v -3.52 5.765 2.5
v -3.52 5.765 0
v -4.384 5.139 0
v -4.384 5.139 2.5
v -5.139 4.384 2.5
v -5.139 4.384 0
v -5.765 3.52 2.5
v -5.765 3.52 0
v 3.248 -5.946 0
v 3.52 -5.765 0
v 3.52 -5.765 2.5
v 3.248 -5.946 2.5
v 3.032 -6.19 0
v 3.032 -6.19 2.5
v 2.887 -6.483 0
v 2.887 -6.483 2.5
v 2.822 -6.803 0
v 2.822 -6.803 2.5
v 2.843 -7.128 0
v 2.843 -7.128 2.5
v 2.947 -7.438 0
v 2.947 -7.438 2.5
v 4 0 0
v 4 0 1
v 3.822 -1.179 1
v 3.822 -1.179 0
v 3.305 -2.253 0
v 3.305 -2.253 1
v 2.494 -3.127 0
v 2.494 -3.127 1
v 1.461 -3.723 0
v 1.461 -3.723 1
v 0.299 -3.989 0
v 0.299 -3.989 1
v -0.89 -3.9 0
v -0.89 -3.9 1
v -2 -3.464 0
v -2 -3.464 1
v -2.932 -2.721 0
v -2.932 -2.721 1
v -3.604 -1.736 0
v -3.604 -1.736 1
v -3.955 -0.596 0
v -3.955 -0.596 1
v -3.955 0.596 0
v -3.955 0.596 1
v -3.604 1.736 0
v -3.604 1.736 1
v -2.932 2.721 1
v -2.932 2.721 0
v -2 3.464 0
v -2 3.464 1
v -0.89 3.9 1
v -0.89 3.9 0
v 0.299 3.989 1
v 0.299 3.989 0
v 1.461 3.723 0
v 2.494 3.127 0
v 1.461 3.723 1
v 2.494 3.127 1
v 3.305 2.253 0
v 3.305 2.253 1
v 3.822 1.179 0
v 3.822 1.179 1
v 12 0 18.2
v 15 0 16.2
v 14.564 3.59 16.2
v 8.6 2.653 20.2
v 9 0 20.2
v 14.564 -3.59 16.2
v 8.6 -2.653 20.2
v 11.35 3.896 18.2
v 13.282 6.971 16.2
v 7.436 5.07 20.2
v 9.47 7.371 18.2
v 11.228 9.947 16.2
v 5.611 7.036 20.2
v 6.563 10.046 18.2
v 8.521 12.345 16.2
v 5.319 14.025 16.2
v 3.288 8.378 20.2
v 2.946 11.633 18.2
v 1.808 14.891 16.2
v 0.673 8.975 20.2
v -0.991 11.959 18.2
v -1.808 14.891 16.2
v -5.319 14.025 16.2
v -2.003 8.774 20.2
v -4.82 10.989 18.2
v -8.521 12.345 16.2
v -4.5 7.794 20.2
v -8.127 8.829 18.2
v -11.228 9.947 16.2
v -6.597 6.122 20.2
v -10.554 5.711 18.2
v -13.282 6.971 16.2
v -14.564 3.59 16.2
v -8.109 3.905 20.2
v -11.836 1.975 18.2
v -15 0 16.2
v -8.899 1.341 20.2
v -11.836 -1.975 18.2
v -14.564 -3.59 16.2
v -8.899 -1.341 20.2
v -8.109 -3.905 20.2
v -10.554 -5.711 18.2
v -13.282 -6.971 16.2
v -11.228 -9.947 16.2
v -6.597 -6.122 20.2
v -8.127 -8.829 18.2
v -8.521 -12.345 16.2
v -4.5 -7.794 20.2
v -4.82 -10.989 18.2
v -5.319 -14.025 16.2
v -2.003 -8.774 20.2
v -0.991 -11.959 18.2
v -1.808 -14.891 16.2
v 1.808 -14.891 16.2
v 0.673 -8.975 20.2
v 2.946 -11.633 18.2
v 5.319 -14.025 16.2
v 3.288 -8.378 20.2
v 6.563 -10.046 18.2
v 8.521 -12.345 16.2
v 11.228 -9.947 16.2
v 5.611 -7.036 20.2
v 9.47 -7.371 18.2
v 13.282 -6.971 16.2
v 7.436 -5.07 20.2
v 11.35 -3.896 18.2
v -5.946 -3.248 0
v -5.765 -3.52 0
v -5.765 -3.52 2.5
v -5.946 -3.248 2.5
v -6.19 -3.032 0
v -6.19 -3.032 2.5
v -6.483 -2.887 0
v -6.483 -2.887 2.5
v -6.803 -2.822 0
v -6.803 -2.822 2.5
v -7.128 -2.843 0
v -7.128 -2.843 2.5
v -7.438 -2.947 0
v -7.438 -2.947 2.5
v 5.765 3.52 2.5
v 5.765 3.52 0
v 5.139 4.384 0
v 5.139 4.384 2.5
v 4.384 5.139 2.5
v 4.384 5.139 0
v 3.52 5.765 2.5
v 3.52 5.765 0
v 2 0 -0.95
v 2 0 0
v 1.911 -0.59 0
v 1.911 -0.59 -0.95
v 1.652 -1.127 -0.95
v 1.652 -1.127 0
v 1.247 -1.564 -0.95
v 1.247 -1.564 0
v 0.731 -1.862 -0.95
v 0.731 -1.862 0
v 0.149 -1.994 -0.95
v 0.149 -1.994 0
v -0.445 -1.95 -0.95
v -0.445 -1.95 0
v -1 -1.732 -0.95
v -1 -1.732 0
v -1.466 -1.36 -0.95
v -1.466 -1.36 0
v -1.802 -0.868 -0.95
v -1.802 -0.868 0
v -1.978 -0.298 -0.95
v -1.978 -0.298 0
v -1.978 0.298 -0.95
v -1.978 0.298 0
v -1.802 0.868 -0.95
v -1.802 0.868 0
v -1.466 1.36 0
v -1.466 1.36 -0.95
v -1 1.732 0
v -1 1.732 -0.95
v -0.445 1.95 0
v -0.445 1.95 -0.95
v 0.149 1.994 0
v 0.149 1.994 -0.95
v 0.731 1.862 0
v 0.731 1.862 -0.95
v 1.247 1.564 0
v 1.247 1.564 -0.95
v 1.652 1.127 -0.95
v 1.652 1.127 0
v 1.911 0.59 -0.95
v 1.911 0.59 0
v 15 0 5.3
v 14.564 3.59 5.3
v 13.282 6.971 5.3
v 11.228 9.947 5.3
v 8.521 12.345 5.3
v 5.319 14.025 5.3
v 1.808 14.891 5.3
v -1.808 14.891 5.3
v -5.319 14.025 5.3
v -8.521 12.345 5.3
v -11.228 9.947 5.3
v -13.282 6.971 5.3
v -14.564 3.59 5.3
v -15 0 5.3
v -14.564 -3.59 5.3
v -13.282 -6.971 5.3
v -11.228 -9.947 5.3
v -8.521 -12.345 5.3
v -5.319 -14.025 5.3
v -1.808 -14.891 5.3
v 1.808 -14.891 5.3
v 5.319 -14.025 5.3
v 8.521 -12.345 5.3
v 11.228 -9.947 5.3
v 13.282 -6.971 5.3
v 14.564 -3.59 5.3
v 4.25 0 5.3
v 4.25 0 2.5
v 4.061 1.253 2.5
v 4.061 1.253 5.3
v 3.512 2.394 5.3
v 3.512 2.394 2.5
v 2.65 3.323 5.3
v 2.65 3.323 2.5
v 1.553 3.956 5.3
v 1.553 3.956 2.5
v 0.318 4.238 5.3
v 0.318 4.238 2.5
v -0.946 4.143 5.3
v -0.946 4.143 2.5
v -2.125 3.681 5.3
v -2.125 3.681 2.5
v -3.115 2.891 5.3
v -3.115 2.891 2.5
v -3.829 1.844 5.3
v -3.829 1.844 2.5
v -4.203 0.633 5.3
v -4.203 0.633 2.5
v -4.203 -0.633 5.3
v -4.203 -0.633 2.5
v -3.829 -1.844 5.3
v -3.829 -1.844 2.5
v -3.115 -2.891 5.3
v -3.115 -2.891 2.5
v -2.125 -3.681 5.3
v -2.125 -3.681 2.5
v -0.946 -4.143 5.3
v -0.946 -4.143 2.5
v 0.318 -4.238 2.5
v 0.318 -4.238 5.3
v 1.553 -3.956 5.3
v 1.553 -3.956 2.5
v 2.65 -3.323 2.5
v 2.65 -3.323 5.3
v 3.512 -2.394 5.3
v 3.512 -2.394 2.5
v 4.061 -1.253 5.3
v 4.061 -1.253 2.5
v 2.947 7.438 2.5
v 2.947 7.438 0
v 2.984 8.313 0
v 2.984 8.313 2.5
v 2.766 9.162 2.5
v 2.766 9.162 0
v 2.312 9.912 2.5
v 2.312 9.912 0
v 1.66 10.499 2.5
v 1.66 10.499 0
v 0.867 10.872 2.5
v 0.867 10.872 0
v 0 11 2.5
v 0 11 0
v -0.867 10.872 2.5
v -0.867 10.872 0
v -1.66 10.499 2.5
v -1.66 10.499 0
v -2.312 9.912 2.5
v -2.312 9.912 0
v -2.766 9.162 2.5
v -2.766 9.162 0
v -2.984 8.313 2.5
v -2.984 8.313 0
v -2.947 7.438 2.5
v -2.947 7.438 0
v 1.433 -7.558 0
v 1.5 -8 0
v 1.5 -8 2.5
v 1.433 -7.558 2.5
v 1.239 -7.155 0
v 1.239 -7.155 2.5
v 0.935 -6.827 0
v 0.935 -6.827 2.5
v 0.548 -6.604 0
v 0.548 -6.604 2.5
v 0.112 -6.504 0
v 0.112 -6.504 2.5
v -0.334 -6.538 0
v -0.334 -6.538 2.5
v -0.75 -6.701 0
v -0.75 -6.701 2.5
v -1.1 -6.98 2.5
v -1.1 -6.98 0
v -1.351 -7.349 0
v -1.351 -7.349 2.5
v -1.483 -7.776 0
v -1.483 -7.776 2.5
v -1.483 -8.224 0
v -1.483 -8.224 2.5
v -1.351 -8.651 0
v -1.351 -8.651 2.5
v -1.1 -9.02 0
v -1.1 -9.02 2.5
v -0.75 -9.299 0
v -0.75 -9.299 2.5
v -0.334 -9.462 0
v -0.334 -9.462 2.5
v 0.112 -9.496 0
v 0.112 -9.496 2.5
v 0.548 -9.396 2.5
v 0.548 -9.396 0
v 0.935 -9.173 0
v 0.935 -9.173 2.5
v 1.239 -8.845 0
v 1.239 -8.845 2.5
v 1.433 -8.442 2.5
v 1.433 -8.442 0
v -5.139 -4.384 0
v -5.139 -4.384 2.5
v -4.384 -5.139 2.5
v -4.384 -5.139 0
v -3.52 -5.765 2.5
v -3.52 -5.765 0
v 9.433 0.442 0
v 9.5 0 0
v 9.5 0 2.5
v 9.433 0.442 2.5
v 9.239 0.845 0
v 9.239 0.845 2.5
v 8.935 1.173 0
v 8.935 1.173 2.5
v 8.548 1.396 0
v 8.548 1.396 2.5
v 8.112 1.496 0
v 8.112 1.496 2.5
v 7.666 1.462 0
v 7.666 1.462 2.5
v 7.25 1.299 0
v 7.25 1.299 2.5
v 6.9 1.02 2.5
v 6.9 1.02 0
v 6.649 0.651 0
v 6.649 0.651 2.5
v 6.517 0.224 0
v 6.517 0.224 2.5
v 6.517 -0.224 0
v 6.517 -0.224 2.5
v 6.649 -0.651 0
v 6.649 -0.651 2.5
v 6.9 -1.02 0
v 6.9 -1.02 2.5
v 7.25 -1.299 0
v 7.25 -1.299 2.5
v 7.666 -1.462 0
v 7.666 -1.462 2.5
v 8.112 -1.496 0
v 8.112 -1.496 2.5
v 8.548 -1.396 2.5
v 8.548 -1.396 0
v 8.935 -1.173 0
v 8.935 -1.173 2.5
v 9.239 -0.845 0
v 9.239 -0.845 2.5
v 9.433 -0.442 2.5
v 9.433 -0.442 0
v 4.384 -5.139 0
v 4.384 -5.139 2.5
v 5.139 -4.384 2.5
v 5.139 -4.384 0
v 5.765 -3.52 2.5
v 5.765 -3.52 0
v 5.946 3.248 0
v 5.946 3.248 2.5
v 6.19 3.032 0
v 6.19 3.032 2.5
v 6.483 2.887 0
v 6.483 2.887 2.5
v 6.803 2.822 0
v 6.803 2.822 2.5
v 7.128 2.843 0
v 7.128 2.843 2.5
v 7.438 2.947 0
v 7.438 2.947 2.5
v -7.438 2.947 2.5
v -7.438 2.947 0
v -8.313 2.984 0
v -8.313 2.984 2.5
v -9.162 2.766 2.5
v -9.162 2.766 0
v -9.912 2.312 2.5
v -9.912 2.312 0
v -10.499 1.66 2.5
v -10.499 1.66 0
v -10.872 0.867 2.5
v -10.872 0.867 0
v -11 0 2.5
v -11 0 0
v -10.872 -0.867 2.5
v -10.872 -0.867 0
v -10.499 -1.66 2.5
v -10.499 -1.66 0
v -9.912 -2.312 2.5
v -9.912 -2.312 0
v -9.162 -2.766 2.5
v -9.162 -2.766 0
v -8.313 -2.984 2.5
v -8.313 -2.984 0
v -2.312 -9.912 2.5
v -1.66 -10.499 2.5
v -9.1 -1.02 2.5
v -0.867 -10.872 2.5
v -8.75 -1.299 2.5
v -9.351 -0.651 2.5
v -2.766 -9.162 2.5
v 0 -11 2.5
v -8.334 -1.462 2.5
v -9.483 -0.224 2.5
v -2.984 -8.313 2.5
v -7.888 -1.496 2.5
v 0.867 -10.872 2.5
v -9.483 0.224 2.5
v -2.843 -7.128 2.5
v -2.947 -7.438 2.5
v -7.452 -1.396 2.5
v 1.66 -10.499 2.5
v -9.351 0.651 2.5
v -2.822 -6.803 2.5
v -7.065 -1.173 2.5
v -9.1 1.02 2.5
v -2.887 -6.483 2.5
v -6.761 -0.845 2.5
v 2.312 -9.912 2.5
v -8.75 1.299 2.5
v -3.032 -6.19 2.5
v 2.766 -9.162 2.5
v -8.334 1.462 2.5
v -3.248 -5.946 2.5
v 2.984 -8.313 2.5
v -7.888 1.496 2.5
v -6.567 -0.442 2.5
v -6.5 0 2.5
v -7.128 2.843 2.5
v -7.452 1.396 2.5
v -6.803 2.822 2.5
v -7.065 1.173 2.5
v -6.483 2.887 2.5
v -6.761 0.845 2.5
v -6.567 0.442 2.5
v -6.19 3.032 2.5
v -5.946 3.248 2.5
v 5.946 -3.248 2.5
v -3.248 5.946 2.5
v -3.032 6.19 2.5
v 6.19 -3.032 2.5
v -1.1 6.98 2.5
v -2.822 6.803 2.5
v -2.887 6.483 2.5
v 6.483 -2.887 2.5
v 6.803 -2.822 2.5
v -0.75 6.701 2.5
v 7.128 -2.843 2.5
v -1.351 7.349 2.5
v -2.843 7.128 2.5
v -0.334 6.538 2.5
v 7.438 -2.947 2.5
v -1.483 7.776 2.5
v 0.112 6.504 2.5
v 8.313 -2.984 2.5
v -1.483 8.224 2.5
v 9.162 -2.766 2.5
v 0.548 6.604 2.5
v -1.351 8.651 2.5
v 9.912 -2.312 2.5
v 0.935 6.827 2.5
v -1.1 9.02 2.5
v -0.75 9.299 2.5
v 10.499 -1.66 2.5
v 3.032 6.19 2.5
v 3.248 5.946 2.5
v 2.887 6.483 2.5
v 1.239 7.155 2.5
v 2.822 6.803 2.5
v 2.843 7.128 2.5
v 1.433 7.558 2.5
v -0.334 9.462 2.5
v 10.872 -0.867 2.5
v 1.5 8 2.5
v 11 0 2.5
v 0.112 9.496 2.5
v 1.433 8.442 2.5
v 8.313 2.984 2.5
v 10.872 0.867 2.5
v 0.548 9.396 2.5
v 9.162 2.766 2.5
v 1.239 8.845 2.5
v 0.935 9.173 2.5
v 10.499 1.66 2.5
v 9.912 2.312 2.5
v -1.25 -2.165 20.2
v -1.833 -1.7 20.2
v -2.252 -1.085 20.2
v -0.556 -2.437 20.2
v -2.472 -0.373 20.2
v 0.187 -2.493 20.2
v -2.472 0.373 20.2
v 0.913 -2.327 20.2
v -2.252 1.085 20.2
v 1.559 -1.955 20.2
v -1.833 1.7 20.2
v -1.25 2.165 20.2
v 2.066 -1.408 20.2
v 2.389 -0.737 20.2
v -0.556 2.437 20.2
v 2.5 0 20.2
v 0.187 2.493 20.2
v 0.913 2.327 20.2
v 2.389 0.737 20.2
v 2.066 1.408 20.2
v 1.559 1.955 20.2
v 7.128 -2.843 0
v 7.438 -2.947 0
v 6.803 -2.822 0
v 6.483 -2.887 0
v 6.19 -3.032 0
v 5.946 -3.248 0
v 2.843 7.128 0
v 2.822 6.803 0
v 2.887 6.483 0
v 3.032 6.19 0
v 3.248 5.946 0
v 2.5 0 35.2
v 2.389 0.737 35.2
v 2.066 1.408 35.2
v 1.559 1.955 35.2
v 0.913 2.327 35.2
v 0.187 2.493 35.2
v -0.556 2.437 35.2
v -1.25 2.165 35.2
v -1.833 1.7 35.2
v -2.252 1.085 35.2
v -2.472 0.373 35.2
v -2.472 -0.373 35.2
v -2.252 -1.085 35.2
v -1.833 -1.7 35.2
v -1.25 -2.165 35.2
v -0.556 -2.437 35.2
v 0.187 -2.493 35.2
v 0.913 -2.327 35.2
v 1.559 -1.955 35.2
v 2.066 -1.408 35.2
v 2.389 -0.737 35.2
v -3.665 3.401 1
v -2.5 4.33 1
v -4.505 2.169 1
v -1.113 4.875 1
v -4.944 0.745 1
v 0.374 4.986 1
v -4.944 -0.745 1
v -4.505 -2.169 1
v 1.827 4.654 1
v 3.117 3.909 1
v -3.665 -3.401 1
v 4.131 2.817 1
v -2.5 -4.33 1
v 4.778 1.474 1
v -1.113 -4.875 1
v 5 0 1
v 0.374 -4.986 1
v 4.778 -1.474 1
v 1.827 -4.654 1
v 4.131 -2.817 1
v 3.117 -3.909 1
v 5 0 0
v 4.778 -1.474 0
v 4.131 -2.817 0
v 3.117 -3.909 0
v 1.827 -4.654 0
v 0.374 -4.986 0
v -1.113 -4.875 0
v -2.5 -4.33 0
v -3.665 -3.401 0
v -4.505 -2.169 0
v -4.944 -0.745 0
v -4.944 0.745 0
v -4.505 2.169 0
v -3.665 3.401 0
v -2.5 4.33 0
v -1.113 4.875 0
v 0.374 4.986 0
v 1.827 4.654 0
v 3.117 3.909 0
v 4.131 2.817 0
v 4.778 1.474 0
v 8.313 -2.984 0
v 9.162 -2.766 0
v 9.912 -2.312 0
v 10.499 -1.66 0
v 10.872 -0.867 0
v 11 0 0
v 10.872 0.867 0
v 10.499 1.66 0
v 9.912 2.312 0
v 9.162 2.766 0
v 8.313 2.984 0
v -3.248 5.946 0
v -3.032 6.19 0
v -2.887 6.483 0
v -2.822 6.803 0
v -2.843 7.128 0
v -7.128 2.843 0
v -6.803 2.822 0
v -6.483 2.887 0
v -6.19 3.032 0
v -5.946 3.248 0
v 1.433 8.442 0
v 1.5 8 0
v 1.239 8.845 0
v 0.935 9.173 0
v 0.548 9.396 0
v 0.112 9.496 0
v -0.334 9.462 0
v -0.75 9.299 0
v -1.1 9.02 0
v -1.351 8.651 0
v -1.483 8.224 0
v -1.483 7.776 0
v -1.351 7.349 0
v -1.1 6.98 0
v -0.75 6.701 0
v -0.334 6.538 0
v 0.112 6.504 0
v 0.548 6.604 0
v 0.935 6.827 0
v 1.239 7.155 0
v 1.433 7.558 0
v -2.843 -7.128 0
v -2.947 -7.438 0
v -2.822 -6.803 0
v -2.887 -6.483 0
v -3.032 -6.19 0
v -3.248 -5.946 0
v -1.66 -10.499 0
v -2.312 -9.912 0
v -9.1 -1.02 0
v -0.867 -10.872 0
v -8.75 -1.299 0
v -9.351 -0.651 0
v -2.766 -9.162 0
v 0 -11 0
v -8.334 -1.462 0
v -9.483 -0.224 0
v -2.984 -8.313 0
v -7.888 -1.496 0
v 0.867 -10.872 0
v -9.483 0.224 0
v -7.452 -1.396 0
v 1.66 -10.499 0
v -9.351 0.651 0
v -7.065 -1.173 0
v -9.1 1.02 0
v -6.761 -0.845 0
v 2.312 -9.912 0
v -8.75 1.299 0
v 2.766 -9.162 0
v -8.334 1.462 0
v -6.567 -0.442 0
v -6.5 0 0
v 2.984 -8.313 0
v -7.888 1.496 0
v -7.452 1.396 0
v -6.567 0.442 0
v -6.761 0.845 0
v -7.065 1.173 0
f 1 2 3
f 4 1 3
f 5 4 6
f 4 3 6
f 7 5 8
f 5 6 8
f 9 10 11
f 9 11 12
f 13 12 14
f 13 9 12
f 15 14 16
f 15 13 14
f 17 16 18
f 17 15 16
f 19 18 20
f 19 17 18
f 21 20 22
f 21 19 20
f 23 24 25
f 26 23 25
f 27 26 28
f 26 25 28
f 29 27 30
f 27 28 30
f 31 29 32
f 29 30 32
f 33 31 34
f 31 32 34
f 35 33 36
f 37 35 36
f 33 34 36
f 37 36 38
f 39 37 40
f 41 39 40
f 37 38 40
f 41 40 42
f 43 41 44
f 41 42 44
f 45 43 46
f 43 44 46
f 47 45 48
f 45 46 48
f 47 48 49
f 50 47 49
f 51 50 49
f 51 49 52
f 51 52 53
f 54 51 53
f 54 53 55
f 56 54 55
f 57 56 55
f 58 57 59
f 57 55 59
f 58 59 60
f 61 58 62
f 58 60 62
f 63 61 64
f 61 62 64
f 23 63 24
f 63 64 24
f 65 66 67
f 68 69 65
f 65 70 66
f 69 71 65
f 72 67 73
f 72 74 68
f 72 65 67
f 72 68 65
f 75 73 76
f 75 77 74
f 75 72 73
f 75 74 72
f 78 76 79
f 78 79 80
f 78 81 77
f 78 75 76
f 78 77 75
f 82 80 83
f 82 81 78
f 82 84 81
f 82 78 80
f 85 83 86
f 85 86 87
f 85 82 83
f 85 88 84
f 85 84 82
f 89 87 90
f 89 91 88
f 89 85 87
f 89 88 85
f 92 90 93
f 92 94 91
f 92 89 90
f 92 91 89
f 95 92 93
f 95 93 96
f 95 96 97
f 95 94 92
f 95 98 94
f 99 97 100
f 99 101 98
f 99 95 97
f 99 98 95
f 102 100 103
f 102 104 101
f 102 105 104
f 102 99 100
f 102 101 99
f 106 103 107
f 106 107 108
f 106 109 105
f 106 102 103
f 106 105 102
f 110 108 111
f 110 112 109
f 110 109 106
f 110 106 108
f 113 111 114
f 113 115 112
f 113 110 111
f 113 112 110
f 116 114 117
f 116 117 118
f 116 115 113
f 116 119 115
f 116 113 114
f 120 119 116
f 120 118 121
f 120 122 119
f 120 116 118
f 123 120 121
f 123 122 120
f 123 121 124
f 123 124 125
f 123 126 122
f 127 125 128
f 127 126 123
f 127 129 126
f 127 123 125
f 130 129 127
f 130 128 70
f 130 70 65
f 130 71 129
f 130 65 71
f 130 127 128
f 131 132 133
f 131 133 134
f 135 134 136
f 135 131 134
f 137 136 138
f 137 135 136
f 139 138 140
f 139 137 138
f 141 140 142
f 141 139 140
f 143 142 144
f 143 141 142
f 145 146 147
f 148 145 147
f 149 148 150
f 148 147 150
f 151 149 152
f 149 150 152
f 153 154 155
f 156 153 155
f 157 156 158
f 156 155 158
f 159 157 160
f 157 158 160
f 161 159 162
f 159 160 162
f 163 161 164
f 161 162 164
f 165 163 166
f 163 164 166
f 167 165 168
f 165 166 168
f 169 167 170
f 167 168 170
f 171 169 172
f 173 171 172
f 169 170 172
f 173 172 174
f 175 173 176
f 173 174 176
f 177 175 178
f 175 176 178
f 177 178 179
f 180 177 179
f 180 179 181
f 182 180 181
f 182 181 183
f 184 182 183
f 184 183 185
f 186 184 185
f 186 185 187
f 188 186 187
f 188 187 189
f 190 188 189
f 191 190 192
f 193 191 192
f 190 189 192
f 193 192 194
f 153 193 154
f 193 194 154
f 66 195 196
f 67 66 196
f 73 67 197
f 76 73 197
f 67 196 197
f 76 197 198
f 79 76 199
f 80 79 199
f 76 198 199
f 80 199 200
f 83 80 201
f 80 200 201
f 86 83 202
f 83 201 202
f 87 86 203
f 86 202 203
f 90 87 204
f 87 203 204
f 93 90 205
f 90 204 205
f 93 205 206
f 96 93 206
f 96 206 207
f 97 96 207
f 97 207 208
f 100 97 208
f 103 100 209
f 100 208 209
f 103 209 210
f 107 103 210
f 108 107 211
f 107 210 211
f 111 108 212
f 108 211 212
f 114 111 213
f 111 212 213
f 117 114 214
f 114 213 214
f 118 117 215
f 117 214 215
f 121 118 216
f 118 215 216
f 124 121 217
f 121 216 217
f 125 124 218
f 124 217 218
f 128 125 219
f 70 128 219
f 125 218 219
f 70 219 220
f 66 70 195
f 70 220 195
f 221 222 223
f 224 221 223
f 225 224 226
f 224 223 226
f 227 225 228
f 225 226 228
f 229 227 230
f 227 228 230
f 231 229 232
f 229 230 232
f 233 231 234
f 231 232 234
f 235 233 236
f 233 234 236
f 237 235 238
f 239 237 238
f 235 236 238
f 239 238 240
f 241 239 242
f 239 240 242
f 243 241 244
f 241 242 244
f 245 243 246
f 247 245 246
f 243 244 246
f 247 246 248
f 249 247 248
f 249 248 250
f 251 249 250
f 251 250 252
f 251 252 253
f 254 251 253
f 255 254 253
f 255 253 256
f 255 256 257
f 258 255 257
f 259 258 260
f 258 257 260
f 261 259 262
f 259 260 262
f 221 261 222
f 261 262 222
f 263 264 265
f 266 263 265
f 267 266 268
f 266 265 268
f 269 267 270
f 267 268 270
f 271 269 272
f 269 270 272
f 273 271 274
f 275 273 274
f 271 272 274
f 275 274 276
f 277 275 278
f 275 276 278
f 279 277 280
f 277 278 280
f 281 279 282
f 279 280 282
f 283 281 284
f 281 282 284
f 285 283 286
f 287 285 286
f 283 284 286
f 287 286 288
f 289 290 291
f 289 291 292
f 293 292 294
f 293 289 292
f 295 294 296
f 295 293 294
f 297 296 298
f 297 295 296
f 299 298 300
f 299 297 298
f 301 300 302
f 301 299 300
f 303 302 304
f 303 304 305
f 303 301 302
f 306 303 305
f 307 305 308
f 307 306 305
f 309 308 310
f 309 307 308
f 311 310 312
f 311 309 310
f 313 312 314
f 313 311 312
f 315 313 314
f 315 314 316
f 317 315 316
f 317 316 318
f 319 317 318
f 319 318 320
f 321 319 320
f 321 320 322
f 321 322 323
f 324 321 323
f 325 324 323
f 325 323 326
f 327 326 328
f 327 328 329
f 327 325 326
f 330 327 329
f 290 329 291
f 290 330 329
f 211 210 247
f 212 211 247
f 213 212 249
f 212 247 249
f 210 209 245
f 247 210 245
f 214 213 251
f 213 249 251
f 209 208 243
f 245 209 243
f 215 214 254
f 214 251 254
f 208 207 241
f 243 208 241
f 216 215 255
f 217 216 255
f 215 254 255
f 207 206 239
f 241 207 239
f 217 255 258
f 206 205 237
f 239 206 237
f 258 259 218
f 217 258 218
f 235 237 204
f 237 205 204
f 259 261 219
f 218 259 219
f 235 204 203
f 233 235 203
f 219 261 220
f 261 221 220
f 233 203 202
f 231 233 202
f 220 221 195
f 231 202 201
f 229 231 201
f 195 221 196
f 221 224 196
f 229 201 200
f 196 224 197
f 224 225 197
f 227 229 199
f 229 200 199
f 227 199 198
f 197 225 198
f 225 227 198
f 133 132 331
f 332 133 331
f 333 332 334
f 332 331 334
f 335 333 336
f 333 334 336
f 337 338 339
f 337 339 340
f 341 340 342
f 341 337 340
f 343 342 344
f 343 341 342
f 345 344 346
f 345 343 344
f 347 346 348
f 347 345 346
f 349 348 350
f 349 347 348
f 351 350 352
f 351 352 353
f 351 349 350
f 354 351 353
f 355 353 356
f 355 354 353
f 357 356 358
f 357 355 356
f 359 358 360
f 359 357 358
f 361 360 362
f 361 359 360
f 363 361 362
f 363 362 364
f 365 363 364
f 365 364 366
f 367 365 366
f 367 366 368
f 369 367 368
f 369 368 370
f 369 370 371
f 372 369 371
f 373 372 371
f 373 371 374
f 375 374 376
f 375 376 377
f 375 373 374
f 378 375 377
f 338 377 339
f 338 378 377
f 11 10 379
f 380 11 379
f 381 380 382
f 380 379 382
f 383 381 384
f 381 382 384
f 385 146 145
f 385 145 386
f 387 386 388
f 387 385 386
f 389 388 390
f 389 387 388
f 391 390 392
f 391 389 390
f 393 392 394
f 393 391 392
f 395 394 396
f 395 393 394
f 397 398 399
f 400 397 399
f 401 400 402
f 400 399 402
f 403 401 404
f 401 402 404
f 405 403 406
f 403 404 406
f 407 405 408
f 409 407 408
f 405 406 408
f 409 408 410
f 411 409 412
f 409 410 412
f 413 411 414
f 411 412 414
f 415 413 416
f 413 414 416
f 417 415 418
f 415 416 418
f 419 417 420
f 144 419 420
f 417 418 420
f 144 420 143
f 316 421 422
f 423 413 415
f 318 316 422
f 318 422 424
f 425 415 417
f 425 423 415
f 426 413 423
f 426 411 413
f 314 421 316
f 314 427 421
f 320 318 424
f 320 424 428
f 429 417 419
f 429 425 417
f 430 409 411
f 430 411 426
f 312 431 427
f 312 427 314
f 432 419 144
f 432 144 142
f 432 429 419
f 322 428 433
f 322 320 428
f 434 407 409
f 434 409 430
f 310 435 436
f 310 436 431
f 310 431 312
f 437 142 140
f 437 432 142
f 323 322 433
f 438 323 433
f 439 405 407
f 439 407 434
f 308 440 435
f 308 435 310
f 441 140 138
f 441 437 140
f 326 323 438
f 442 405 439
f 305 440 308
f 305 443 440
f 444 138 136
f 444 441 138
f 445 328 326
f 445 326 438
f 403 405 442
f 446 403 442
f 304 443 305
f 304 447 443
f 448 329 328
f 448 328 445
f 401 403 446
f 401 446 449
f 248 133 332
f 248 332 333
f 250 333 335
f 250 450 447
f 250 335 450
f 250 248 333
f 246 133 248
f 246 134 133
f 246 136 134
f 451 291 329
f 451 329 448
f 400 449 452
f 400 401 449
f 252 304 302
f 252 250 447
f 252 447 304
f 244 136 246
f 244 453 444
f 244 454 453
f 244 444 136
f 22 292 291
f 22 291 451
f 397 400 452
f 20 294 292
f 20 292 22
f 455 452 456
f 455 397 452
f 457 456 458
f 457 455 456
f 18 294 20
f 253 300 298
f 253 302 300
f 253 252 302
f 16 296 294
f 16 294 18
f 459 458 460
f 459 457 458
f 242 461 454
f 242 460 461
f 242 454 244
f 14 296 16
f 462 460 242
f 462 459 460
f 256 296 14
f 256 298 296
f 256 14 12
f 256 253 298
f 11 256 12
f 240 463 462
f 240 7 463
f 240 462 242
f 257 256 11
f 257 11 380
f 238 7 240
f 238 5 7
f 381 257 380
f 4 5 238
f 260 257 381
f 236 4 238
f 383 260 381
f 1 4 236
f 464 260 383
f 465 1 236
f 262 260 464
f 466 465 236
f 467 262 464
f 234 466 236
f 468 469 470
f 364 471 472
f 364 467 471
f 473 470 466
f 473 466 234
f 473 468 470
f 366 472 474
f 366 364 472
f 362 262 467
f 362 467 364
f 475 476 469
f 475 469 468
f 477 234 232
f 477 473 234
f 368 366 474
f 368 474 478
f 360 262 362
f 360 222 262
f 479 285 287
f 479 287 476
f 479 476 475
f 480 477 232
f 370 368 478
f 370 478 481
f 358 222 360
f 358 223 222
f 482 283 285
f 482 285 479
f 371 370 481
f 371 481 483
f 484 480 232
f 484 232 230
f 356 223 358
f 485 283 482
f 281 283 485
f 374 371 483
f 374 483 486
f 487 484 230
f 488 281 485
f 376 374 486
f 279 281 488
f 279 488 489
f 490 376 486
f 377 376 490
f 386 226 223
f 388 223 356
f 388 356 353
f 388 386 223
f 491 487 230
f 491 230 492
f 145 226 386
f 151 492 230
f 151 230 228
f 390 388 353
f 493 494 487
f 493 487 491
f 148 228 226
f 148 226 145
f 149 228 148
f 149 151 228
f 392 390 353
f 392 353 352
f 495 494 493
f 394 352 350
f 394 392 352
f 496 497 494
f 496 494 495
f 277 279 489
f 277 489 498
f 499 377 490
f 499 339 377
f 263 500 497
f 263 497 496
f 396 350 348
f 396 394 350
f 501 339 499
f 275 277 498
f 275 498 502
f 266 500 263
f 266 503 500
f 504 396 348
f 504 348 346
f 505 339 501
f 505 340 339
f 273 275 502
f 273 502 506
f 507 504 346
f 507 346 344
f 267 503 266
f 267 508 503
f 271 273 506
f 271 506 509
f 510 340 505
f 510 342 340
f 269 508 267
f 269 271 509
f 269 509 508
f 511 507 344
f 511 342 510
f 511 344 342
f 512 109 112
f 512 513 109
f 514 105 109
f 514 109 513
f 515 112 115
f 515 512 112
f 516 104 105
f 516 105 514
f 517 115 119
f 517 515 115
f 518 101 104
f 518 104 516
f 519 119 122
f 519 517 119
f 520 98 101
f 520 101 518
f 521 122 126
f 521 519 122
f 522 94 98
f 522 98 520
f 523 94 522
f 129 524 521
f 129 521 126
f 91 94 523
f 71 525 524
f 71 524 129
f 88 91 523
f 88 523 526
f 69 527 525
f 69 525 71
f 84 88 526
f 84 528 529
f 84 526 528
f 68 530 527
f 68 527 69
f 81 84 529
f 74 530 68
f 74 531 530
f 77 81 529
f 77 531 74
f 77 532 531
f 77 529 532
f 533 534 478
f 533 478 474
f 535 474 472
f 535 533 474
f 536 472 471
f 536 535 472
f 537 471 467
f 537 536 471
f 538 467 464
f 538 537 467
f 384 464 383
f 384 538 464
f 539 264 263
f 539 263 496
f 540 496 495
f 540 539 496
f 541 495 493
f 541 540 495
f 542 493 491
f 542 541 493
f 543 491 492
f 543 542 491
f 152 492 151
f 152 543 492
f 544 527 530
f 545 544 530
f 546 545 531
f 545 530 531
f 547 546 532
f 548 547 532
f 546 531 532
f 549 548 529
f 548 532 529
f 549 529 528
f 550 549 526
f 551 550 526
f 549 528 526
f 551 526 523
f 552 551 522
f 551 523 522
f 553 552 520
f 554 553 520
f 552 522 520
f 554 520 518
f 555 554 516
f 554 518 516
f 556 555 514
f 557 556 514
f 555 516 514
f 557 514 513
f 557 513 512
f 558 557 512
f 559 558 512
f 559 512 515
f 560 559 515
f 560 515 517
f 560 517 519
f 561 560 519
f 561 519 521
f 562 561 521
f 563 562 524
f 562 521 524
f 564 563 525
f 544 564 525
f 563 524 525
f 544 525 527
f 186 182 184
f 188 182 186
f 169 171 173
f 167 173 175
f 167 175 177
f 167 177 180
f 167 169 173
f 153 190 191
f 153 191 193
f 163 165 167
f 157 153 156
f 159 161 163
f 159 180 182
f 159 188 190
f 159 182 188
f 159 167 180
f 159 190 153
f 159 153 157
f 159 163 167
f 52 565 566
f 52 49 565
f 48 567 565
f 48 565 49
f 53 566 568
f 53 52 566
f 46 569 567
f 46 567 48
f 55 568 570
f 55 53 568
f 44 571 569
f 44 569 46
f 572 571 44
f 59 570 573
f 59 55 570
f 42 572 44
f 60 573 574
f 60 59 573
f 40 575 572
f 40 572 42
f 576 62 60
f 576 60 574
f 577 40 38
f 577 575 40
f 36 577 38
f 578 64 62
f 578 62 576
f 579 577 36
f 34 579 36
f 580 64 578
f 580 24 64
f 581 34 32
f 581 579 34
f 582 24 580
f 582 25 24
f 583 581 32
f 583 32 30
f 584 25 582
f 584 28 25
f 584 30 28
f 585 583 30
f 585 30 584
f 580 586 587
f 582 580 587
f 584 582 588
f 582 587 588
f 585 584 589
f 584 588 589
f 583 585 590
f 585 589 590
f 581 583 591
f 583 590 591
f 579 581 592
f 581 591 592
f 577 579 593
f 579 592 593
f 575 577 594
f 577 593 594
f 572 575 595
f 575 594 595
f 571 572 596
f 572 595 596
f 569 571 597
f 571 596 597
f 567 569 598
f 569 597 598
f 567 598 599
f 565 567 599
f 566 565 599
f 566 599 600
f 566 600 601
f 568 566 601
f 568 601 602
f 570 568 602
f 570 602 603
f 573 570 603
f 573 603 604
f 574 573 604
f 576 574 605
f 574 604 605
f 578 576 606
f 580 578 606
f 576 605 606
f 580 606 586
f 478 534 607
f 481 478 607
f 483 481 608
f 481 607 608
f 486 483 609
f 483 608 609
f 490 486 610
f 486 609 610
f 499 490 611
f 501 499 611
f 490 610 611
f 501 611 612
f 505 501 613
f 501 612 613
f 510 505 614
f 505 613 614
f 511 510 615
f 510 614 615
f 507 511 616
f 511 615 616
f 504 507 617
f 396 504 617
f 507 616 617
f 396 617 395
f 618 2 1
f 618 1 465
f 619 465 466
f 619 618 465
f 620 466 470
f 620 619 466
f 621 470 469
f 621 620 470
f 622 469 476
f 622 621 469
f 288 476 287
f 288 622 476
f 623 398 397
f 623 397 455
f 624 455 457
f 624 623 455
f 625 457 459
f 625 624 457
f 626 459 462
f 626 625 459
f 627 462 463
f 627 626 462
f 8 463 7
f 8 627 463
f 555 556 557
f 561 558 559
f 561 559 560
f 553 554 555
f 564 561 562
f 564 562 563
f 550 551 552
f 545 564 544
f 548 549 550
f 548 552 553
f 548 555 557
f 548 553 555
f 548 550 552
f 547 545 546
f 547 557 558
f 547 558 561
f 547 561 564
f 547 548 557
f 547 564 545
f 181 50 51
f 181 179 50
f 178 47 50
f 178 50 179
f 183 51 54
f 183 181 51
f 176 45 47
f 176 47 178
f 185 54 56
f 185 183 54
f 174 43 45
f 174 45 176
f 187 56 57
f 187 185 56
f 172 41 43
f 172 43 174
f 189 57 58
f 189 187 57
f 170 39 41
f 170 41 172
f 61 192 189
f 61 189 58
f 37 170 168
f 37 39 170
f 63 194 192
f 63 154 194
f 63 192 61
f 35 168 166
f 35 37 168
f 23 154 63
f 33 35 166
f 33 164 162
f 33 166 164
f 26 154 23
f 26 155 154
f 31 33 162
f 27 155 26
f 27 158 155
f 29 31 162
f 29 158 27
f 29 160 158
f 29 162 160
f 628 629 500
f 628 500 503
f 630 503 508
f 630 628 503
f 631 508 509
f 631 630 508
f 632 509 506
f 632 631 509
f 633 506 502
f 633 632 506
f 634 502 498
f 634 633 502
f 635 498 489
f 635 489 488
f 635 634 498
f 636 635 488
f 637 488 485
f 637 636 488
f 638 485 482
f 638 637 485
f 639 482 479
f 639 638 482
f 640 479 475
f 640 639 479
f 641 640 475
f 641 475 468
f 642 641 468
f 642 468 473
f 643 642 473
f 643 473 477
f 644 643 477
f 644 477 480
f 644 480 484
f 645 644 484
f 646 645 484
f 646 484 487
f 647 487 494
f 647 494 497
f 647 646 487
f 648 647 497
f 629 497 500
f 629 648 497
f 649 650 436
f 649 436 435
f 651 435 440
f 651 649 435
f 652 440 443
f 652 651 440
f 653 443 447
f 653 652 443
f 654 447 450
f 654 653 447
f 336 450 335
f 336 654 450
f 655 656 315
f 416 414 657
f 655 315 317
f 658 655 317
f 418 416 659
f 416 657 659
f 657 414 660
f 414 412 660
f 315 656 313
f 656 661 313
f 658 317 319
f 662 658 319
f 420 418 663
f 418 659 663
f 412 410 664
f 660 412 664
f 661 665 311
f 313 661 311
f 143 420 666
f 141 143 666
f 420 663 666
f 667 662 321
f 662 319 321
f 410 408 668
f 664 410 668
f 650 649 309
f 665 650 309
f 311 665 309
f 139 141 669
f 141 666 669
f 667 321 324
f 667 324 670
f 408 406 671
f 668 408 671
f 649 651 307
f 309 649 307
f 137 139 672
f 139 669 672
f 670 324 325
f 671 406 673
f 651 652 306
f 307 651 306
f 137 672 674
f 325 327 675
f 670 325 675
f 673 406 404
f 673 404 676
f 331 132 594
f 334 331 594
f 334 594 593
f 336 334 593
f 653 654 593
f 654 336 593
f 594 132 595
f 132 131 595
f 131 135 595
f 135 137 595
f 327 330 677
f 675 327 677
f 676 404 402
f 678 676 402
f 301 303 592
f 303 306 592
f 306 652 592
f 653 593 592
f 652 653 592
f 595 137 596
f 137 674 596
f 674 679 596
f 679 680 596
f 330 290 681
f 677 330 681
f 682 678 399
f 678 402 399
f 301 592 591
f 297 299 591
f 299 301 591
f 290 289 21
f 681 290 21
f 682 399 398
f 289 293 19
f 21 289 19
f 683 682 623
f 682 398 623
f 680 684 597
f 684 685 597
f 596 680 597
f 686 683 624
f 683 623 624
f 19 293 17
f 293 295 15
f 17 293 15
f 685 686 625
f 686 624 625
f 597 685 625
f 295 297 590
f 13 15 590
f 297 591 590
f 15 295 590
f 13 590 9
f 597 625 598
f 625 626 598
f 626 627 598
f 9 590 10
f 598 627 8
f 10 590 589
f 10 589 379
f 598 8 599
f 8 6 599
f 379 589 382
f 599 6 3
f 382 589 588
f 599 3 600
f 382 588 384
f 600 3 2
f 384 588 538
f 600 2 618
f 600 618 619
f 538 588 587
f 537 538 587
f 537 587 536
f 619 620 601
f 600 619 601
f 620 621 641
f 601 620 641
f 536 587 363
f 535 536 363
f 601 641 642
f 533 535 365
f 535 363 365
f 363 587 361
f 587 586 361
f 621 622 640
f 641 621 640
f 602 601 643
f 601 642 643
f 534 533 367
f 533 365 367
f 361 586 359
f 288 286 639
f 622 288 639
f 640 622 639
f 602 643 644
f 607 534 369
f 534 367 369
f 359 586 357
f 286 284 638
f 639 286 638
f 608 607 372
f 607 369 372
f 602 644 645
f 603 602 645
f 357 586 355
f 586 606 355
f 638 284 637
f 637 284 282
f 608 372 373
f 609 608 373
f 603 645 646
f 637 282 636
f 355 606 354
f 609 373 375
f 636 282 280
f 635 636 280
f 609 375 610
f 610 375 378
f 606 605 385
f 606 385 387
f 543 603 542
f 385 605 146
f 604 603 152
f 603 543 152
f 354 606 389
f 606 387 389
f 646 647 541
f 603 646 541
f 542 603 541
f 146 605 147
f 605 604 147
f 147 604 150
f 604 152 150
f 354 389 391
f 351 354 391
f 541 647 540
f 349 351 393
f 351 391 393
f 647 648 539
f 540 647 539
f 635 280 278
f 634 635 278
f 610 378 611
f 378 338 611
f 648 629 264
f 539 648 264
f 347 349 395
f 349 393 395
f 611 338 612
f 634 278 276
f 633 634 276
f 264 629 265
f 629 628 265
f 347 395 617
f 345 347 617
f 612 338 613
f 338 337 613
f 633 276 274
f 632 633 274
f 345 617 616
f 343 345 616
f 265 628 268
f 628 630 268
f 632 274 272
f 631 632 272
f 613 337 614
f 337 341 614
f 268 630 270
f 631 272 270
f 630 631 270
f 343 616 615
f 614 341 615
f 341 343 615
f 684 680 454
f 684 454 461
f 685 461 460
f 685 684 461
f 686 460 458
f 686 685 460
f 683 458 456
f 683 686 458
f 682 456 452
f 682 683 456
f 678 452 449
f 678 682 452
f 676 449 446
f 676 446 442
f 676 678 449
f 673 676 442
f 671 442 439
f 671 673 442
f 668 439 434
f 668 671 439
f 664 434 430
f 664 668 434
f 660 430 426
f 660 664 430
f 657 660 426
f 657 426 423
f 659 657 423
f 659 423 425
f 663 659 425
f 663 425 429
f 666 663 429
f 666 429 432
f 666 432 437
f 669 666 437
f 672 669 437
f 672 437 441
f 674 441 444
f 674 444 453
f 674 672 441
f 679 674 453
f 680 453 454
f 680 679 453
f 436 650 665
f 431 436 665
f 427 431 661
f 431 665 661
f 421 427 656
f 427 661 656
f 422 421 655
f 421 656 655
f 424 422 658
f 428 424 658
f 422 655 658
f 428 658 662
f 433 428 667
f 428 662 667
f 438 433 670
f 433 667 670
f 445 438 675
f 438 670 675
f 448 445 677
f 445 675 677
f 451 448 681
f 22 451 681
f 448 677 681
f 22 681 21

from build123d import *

# Parameters (mm, degrees)
SKETCH_R      = 1.5
PAD_DEPTH     = 2.5
SKETCH001_R   = 4.25
PAD001_DEPTH  = 2.8
SKETCH002_R   = 15
PAD002_DEPTH  = 14.9
SKETCH003_R   = 2.5
PAD003_DEPTH  = 15
CHAMFER_SIZE2 = 6
CHAMFER_SIZE  = 4
SKETCH004_R   = 5
POCKET_DEPTH  = 1
SKETCH005_R   = 4
PAD004_DEPTH  = 1
SKETCH006_R   = 2
PAD005_DEPTH  = 0.95


with BuildPart() as part:
    # Sketch → Pad (new body)
    with BuildSketch(Plane.XY):
        with BuildLine():
            ThreePointArc((2.946794, 7.4375), (0, 11), (-2.946794, 7.4375))
            ThreePointArc((-3.519561, 5.765095), (-2.886811, 6.482674), (-2.946794, 7.4375))
            ThreePointArc((-3.519561, 5.765095), (-4.776172, 4.776172), (-5.765095, 3.519561))
            ThreePointArc((-7.4375, 2.946794), (-6.482674, 2.886811), (-5.765095, 3.519561))
            ThreePointArc((-7.4375, 2.946794), (-11, 0), (-7.4375, -2.946794))
            ThreePointArc((-5.765095, -3.519561), (-6.482674, -2.886811), (-7.4375, -2.946794))
            ThreePointArc((-5.765095, -3.519561), (-4.776172, -4.776172), (-3.519561, -5.765095))
            ThreePointArc((-2.946794, -7.4375), (-2.886811, -6.482674), (-3.519561, -5.765095))
            ThreePointArc((-2.946794, -7.4375), (0, -11), (2.946794, -7.4375))
            ThreePointArc((3.519561, -5.765095), (2.886811, -6.482674), (2.946794, -7.4375))
            ThreePointArc((3.519561, -5.765095), (4.776172, -4.776172), (5.765095, -3.519561))
            ThreePointArc((7.4375, -2.946794), (6.482674, -2.886811), (5.765095, -3.519561))
            ThreePointArc((7.4375, -2.946794), (11, 0), (7.4375, 2.946794))
            ThreePointArc((5.765095, 3.519561), (6.482674, 2.886811), (7.4375, 2.946794))
            ThreePointArc((5.765095, 3.519561), (4.776172, 4.776172), (3.519561, 5.765095))
            ThreePointArc((2.946794, 7.4375), (2.886811, 6.482674), (3.519561, 5.765095))
        make_face()
        with Locations((0, 8)):
            Circle(SKETCH_R, mode=Mode.SUBTRACT)
        with Locations((8, 0)):
            Circle(SKETCH_R, mode=Mode.SUBTRACT)
        with Locations((0, -8)):
            Circle(SKETCH_R, mode=Mode.SUBTRACT)
        with Locations((-8, 0)):
            Circle(SKETCH_R, mode=Mode.SUBTRACT)
    extrude(amount=PAD_DEPTH)

    # Sketch001 (on Face22 of Pad) → Pad001 (join)
    with BuildSketch(Plane.XY.offset(2.5)):
        Circle(SKETCH001_R)
    extrude(amount=PAD001_DEPTH)

    # Sketch002 (on Face24 of Pad001) → Pad002 (join)
    with BuildSketch(Plane.XY.offset(5.3)):
        Circle(SKETCH002_R)
    extrude(amount=PAD002_DEPTH)

    # Sketch003 (on Face3 of Pad002) → Pad003 (join)
    with BuildSketch(Plane.XY.offset(20.2)):
        Circle(SKETCH003_R)
    extrude(amount=PAD003_DEPTH)

    # Chamfer
    chamfer_edges = [part.edges().sort_by_distance(p)[0] for p in [
        (-15, 0, 20.2),
    ]]
    chamfer_side = part.faces().sort_by_distance((-15, 0, 12.75))[0]
    chamfer(chamfer_edges, length=CHAMFER_SIZE, length2=CHAMFER_SIZE2, reference=chamfer_side)

    # Sketch004 (on Face29 of Chamfer) → Pocket (cut)
    with BuildSketch(Plane(origin=(0, 0, 0), x_dir=(1, 0, 0), z_dir=(0, 0, -1))):
        Circle(SKETCH004_R)
    extrude(amount=-POCKET_DEPTH, mode=Mode.SUBTRACT)

    # Sketch005 (on Face31 of Pocket) → Pad004 (join)
    with BuildSketch(Plane(origin=(0, 0, 1), x_dir=(1, 0, 0), z_dir=(0, 0, -1))):
        Circle(SKETCH005_R)
    extrude(amount=PAD004_DEPTH)

    # Sketch006 (on Face33 of Pad004) → Pad005 (join)
    with BuildSketch(Plane(origin=(0, 0, 0), x_dir=(1, 0, 0), z_dir=(0, 0, -1))):
        Circle(SKETCH006_R)
    extrude(amount=PAD005_DEPTH)


solid = part.part
